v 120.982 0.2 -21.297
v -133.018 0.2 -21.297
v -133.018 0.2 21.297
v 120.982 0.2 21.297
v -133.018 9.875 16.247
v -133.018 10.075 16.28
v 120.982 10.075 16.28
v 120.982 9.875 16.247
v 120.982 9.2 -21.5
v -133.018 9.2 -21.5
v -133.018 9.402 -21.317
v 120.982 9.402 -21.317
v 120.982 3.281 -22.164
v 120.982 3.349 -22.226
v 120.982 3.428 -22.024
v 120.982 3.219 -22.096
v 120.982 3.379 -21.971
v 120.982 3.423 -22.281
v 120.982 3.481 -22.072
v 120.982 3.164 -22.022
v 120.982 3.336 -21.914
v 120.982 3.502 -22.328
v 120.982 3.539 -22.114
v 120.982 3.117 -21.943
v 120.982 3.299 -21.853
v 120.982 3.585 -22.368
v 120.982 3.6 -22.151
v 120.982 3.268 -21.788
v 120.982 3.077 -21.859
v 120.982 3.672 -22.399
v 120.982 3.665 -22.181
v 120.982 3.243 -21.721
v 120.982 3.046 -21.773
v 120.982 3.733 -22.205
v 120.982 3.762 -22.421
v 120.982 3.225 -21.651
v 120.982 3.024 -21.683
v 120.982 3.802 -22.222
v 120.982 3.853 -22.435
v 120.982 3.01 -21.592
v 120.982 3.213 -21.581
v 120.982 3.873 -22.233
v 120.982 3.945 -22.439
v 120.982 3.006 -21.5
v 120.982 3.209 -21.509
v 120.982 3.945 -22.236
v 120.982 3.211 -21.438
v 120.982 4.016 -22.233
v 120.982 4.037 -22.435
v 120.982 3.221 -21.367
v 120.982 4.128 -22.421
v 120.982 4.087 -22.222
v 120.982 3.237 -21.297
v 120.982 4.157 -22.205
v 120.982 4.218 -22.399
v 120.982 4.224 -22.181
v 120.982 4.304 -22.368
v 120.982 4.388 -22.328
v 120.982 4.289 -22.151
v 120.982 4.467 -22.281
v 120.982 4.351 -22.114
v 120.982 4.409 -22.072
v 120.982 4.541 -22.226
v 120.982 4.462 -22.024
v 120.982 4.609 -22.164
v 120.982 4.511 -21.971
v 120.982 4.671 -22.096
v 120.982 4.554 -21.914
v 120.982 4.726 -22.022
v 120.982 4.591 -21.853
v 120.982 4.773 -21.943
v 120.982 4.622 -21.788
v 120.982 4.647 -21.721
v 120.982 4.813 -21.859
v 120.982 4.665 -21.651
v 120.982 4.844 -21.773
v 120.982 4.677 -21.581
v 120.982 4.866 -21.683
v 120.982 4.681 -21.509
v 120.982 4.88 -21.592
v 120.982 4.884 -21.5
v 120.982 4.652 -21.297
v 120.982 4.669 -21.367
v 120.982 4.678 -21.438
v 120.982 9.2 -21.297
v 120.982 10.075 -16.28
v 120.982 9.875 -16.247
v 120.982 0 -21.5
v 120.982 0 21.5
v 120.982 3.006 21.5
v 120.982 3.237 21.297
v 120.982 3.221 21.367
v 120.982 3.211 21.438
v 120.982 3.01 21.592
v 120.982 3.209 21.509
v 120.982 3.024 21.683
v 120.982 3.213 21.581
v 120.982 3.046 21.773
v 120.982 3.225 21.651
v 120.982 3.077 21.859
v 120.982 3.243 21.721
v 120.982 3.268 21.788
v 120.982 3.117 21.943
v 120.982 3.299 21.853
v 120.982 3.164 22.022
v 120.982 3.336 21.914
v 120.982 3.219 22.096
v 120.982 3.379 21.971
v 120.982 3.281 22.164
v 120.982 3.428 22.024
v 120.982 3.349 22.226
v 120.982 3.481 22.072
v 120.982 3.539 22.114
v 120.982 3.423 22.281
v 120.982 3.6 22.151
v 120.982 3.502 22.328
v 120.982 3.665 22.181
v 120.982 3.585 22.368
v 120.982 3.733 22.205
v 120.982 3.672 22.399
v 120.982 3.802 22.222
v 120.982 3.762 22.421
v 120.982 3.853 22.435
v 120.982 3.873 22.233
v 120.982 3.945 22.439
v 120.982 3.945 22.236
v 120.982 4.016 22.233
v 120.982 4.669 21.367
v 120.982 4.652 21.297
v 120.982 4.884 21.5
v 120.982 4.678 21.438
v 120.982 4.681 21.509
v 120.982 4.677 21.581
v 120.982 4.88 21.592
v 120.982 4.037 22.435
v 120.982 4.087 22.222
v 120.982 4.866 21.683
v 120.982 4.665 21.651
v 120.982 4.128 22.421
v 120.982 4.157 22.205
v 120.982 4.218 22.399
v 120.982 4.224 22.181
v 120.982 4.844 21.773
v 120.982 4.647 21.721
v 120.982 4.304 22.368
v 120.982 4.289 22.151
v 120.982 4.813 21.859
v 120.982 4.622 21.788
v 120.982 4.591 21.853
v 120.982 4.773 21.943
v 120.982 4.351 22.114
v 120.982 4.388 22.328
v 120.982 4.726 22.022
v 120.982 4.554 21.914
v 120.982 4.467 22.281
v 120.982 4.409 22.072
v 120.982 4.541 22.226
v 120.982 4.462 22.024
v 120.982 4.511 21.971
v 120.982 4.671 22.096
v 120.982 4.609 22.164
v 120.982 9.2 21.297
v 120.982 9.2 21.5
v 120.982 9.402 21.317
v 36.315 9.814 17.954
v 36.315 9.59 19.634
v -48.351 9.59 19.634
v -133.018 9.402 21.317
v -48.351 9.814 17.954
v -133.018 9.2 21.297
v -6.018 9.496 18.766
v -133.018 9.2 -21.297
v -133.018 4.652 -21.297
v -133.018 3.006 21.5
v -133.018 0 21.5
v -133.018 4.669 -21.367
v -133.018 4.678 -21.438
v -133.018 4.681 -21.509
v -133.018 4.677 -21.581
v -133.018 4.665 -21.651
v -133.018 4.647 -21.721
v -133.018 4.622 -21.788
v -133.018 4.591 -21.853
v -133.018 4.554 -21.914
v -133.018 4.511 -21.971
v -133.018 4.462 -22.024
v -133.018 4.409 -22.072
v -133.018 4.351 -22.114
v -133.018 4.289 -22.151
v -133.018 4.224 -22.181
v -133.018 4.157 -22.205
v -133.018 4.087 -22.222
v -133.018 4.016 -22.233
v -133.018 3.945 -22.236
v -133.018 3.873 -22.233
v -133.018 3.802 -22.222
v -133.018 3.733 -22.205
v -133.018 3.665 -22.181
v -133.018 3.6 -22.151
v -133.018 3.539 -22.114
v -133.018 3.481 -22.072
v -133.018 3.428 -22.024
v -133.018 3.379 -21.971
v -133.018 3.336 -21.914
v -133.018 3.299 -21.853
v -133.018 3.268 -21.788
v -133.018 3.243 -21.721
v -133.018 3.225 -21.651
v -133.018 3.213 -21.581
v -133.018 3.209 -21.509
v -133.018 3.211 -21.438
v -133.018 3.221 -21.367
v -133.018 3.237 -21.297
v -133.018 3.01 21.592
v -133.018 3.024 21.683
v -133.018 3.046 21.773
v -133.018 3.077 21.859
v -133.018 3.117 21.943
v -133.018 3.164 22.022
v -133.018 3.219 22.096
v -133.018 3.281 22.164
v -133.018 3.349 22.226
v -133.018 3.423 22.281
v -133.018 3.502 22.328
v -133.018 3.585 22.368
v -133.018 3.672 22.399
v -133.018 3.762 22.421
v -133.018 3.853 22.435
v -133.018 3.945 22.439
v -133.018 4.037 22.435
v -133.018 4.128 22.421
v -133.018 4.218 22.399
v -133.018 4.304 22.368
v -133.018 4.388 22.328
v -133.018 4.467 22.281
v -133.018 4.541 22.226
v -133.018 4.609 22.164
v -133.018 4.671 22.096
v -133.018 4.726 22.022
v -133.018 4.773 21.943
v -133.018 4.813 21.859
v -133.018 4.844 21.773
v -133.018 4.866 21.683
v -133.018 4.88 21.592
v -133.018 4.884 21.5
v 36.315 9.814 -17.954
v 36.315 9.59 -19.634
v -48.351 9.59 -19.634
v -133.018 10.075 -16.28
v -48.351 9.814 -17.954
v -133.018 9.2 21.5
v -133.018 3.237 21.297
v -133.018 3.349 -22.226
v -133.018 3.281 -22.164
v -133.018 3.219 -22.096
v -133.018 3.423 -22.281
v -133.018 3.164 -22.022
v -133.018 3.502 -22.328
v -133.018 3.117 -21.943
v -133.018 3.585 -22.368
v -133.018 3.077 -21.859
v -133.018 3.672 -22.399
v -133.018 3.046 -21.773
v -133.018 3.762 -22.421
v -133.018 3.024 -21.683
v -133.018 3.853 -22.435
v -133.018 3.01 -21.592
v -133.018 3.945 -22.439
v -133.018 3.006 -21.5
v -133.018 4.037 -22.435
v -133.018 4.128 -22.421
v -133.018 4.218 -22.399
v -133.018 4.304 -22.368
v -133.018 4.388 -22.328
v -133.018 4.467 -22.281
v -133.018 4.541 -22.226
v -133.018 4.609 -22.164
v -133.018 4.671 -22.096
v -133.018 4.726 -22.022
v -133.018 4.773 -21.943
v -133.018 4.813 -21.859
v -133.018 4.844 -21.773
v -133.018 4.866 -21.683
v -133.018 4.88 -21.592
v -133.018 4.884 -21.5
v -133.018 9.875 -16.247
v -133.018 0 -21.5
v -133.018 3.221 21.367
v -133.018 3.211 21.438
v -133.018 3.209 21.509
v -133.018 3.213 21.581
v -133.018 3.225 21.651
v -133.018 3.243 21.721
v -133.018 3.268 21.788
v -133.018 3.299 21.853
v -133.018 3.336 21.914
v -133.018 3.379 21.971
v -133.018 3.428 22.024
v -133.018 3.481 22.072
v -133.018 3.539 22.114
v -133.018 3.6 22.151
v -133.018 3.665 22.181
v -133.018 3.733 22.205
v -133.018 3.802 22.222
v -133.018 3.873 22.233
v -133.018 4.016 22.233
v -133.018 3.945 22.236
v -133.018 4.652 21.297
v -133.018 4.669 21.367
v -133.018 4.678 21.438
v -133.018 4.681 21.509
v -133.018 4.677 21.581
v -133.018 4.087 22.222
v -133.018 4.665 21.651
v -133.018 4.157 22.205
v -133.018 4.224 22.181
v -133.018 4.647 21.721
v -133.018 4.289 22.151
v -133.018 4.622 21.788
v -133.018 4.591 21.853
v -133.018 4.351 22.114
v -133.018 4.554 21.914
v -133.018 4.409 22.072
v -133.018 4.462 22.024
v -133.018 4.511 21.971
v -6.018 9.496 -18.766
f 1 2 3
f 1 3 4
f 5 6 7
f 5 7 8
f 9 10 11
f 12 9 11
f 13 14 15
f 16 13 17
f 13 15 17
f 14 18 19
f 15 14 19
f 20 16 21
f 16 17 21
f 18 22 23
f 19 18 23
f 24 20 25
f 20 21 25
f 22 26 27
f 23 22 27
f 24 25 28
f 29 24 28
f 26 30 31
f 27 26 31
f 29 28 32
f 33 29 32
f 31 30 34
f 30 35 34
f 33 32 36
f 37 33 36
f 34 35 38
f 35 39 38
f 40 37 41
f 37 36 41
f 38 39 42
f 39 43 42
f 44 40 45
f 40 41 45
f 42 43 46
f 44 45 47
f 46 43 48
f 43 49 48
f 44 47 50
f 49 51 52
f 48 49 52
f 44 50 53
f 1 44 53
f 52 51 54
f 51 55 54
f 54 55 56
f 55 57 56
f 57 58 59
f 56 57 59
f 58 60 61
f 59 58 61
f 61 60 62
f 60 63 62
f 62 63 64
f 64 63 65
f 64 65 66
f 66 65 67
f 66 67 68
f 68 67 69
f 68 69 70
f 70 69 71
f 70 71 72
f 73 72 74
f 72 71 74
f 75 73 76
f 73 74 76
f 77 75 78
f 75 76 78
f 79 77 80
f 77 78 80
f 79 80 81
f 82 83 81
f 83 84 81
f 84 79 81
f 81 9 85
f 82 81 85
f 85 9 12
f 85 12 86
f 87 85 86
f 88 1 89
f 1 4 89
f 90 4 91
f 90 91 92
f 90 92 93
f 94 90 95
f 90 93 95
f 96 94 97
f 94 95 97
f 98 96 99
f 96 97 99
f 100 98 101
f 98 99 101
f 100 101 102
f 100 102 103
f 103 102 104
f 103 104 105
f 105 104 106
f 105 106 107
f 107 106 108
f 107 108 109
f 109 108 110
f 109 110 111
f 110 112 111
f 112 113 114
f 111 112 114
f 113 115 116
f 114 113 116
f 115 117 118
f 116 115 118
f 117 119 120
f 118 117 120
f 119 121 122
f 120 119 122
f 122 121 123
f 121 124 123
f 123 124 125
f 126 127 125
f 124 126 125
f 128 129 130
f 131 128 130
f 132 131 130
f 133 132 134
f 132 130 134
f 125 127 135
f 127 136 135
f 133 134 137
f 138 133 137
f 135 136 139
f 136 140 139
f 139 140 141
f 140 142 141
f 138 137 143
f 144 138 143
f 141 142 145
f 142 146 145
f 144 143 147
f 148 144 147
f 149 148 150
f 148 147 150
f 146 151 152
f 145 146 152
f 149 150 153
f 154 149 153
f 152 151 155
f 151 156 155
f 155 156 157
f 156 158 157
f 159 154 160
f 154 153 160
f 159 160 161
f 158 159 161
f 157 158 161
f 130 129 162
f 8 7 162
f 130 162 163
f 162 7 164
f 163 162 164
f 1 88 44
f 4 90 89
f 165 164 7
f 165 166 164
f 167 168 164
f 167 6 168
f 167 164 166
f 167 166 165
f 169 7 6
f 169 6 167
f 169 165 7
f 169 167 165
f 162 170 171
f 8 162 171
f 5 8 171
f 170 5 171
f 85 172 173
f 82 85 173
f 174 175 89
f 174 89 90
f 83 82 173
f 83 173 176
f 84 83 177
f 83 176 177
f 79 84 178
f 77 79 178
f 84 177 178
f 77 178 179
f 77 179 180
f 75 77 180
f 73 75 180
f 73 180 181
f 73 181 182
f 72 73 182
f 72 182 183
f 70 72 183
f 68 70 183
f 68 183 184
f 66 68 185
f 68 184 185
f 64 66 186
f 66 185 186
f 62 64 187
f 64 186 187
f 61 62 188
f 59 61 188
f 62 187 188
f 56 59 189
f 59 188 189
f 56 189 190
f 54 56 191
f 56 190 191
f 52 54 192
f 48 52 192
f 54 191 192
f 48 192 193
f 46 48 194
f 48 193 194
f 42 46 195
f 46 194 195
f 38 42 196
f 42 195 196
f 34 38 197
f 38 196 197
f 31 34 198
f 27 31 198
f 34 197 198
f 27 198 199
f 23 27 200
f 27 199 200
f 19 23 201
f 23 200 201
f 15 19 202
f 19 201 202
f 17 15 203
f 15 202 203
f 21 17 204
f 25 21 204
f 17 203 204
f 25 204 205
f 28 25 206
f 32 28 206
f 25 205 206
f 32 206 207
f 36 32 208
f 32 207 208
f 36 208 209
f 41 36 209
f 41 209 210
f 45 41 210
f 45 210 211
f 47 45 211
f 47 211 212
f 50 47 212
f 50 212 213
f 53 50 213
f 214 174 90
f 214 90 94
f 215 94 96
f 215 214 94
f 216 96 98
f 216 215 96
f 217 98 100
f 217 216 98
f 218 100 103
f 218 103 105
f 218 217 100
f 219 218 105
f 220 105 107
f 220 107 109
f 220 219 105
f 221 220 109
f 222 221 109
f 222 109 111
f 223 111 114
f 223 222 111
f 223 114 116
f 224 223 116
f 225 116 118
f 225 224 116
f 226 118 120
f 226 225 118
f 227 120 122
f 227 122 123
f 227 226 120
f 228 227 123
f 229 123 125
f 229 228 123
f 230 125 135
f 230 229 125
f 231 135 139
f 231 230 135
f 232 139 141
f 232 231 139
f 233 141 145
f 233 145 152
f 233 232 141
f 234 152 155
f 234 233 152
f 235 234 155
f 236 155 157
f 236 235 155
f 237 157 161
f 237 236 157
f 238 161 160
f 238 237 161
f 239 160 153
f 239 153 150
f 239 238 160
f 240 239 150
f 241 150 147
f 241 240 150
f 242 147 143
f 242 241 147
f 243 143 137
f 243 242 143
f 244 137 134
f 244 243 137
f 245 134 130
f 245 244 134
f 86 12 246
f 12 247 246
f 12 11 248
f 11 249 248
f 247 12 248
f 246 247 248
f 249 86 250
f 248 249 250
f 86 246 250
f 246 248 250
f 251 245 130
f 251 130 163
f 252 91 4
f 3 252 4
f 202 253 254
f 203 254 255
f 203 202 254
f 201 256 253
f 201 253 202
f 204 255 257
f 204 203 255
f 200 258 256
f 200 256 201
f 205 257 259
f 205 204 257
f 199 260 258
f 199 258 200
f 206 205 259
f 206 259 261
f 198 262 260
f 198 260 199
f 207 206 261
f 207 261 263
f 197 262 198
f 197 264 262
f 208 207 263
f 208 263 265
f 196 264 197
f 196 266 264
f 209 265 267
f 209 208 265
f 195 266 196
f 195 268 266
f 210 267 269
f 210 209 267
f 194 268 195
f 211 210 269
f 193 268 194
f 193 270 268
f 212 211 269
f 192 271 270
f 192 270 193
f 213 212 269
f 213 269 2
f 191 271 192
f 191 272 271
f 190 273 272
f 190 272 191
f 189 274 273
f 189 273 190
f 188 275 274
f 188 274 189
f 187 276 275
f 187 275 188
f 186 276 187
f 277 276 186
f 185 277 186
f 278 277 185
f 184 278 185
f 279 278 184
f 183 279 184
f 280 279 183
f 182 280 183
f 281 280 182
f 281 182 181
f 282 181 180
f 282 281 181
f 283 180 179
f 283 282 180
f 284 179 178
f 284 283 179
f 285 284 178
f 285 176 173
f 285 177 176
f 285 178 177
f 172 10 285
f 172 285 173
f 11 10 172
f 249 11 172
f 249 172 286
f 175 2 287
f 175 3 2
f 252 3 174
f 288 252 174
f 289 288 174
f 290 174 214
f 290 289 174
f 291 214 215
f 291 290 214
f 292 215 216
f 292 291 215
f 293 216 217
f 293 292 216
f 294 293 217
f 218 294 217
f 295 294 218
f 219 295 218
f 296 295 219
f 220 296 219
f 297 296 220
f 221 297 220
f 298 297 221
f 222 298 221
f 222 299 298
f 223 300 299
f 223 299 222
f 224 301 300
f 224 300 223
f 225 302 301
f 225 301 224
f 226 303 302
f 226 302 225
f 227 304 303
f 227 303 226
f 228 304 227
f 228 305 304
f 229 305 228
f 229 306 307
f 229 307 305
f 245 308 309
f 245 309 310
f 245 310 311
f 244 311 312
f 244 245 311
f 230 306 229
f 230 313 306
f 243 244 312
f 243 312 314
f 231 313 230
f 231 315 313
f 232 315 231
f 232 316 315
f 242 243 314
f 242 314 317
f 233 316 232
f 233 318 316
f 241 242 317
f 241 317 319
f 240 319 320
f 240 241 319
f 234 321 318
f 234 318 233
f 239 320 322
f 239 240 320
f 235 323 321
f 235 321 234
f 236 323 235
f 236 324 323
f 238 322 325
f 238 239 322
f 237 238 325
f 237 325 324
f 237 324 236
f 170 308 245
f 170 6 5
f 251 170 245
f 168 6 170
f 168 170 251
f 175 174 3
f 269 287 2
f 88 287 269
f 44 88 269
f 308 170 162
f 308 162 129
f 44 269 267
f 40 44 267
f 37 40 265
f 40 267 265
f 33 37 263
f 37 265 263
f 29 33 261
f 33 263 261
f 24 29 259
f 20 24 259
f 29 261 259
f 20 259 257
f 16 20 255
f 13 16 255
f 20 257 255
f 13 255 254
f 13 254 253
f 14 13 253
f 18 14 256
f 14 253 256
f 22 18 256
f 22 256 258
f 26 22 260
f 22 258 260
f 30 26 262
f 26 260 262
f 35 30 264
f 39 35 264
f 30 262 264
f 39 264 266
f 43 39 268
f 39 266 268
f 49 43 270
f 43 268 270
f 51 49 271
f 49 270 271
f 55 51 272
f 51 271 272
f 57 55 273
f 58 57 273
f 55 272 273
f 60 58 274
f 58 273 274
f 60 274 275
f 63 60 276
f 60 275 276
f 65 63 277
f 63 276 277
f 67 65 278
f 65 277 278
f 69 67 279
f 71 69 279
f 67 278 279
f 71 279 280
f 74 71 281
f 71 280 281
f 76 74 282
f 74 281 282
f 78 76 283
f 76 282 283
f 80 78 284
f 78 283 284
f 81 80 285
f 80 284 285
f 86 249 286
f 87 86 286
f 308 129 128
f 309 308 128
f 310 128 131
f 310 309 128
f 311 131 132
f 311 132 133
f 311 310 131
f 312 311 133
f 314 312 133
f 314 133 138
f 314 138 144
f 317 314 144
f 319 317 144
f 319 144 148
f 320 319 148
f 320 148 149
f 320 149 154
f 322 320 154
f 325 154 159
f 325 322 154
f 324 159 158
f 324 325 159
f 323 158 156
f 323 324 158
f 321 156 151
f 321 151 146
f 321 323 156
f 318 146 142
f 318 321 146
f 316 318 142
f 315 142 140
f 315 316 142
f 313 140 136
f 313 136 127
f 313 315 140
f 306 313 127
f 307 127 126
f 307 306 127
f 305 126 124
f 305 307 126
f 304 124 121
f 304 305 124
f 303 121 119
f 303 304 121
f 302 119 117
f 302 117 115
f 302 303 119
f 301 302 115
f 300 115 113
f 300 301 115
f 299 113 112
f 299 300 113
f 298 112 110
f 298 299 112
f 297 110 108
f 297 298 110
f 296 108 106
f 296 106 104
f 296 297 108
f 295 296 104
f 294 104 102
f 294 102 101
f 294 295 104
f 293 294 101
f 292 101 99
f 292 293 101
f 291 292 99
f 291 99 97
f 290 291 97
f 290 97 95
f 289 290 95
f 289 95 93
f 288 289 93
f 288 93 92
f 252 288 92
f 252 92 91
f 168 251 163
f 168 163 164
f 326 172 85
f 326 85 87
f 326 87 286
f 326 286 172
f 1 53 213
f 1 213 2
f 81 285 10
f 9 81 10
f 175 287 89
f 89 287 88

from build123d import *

# Parameters (mm, degrees)
SKETCH1_W           = 254
SKETCH1_H           = 43
BOSS_EXTRUDE1_DEPTH = 0.2
BOSS_EXTRUDE2_DEPTH = 254


with BuildPart() as part:
    # Sketch1 → Boss-Extrude1 (new body)
    with BuildSketch(Plane(origin=(0, 0, 0), x_dir=(1, 0, 0), z_dir=(0, 1, 0))):
        with Locations((-6.018162295, 0)):
            Rectangle(SKETCH1_W, SKETCH1_H)
    extrude(amount=BOSS_EXTRUDE1_DEPTH)

    # Sketch4 → Boss-Extrude2 (add)
    with BuildSketch(Plane(origin=(-133.018162295, 0, 0), x_dir=(0, 0, -1), z_dir=(1, 0, 0))):
        with BuildLine():
            Line((21.5, 0.2), (21.5, 3.005611905))
            ThreePointArc((21.5, 3.005611905), (22.439298034, 3.944909939), (21.5, 4.884207973))
            Line((21.5, 4.884207973), (21.5, 9.2))
            Line((21.5, 9.2), (21.317120226, 9.402181424))
            add(Edge.make_bspline(
                [(21.317120226, 9.402181424), (19.631812119, 9.571563167), (17.951135022, 9.796064061), (16.280476178, 10.075084883)],
                knots=[0, 0, 0, 0, 1, 1, 1, 1], degree=3))
            Line((16.280476178, 10.075084883), (16.247002876, 9.874660887))
            add(Edge.make_bspline(
                [(21.2968, 9.2), (18.759973351, 9.454963539), (16.247002876, 9.874660887)],
                knots=[0, 0, 0, 1, 1, 1], degree=2))
            Line((21.2968, 9.2), (21.2968, 4.652405576))
            ThreePointArc((21.2968, 4.652405576), (22.236098034, 3.944909939), (21.2968, 3.237414303))
            Line((21.2968, 3.237414303), (21.2968, 0.2))
            Line((21.2968, 0.2), (21.5, 0.2))
        make_face()
    boss_extrude2 = extrude(amount=BOSS_EXTRUDE2_DEPTH)

    # Mirror1: Boss-Extrude2 across plane
    add(boss_extrude2.mirror(Plane.XY))


solid = part.part
